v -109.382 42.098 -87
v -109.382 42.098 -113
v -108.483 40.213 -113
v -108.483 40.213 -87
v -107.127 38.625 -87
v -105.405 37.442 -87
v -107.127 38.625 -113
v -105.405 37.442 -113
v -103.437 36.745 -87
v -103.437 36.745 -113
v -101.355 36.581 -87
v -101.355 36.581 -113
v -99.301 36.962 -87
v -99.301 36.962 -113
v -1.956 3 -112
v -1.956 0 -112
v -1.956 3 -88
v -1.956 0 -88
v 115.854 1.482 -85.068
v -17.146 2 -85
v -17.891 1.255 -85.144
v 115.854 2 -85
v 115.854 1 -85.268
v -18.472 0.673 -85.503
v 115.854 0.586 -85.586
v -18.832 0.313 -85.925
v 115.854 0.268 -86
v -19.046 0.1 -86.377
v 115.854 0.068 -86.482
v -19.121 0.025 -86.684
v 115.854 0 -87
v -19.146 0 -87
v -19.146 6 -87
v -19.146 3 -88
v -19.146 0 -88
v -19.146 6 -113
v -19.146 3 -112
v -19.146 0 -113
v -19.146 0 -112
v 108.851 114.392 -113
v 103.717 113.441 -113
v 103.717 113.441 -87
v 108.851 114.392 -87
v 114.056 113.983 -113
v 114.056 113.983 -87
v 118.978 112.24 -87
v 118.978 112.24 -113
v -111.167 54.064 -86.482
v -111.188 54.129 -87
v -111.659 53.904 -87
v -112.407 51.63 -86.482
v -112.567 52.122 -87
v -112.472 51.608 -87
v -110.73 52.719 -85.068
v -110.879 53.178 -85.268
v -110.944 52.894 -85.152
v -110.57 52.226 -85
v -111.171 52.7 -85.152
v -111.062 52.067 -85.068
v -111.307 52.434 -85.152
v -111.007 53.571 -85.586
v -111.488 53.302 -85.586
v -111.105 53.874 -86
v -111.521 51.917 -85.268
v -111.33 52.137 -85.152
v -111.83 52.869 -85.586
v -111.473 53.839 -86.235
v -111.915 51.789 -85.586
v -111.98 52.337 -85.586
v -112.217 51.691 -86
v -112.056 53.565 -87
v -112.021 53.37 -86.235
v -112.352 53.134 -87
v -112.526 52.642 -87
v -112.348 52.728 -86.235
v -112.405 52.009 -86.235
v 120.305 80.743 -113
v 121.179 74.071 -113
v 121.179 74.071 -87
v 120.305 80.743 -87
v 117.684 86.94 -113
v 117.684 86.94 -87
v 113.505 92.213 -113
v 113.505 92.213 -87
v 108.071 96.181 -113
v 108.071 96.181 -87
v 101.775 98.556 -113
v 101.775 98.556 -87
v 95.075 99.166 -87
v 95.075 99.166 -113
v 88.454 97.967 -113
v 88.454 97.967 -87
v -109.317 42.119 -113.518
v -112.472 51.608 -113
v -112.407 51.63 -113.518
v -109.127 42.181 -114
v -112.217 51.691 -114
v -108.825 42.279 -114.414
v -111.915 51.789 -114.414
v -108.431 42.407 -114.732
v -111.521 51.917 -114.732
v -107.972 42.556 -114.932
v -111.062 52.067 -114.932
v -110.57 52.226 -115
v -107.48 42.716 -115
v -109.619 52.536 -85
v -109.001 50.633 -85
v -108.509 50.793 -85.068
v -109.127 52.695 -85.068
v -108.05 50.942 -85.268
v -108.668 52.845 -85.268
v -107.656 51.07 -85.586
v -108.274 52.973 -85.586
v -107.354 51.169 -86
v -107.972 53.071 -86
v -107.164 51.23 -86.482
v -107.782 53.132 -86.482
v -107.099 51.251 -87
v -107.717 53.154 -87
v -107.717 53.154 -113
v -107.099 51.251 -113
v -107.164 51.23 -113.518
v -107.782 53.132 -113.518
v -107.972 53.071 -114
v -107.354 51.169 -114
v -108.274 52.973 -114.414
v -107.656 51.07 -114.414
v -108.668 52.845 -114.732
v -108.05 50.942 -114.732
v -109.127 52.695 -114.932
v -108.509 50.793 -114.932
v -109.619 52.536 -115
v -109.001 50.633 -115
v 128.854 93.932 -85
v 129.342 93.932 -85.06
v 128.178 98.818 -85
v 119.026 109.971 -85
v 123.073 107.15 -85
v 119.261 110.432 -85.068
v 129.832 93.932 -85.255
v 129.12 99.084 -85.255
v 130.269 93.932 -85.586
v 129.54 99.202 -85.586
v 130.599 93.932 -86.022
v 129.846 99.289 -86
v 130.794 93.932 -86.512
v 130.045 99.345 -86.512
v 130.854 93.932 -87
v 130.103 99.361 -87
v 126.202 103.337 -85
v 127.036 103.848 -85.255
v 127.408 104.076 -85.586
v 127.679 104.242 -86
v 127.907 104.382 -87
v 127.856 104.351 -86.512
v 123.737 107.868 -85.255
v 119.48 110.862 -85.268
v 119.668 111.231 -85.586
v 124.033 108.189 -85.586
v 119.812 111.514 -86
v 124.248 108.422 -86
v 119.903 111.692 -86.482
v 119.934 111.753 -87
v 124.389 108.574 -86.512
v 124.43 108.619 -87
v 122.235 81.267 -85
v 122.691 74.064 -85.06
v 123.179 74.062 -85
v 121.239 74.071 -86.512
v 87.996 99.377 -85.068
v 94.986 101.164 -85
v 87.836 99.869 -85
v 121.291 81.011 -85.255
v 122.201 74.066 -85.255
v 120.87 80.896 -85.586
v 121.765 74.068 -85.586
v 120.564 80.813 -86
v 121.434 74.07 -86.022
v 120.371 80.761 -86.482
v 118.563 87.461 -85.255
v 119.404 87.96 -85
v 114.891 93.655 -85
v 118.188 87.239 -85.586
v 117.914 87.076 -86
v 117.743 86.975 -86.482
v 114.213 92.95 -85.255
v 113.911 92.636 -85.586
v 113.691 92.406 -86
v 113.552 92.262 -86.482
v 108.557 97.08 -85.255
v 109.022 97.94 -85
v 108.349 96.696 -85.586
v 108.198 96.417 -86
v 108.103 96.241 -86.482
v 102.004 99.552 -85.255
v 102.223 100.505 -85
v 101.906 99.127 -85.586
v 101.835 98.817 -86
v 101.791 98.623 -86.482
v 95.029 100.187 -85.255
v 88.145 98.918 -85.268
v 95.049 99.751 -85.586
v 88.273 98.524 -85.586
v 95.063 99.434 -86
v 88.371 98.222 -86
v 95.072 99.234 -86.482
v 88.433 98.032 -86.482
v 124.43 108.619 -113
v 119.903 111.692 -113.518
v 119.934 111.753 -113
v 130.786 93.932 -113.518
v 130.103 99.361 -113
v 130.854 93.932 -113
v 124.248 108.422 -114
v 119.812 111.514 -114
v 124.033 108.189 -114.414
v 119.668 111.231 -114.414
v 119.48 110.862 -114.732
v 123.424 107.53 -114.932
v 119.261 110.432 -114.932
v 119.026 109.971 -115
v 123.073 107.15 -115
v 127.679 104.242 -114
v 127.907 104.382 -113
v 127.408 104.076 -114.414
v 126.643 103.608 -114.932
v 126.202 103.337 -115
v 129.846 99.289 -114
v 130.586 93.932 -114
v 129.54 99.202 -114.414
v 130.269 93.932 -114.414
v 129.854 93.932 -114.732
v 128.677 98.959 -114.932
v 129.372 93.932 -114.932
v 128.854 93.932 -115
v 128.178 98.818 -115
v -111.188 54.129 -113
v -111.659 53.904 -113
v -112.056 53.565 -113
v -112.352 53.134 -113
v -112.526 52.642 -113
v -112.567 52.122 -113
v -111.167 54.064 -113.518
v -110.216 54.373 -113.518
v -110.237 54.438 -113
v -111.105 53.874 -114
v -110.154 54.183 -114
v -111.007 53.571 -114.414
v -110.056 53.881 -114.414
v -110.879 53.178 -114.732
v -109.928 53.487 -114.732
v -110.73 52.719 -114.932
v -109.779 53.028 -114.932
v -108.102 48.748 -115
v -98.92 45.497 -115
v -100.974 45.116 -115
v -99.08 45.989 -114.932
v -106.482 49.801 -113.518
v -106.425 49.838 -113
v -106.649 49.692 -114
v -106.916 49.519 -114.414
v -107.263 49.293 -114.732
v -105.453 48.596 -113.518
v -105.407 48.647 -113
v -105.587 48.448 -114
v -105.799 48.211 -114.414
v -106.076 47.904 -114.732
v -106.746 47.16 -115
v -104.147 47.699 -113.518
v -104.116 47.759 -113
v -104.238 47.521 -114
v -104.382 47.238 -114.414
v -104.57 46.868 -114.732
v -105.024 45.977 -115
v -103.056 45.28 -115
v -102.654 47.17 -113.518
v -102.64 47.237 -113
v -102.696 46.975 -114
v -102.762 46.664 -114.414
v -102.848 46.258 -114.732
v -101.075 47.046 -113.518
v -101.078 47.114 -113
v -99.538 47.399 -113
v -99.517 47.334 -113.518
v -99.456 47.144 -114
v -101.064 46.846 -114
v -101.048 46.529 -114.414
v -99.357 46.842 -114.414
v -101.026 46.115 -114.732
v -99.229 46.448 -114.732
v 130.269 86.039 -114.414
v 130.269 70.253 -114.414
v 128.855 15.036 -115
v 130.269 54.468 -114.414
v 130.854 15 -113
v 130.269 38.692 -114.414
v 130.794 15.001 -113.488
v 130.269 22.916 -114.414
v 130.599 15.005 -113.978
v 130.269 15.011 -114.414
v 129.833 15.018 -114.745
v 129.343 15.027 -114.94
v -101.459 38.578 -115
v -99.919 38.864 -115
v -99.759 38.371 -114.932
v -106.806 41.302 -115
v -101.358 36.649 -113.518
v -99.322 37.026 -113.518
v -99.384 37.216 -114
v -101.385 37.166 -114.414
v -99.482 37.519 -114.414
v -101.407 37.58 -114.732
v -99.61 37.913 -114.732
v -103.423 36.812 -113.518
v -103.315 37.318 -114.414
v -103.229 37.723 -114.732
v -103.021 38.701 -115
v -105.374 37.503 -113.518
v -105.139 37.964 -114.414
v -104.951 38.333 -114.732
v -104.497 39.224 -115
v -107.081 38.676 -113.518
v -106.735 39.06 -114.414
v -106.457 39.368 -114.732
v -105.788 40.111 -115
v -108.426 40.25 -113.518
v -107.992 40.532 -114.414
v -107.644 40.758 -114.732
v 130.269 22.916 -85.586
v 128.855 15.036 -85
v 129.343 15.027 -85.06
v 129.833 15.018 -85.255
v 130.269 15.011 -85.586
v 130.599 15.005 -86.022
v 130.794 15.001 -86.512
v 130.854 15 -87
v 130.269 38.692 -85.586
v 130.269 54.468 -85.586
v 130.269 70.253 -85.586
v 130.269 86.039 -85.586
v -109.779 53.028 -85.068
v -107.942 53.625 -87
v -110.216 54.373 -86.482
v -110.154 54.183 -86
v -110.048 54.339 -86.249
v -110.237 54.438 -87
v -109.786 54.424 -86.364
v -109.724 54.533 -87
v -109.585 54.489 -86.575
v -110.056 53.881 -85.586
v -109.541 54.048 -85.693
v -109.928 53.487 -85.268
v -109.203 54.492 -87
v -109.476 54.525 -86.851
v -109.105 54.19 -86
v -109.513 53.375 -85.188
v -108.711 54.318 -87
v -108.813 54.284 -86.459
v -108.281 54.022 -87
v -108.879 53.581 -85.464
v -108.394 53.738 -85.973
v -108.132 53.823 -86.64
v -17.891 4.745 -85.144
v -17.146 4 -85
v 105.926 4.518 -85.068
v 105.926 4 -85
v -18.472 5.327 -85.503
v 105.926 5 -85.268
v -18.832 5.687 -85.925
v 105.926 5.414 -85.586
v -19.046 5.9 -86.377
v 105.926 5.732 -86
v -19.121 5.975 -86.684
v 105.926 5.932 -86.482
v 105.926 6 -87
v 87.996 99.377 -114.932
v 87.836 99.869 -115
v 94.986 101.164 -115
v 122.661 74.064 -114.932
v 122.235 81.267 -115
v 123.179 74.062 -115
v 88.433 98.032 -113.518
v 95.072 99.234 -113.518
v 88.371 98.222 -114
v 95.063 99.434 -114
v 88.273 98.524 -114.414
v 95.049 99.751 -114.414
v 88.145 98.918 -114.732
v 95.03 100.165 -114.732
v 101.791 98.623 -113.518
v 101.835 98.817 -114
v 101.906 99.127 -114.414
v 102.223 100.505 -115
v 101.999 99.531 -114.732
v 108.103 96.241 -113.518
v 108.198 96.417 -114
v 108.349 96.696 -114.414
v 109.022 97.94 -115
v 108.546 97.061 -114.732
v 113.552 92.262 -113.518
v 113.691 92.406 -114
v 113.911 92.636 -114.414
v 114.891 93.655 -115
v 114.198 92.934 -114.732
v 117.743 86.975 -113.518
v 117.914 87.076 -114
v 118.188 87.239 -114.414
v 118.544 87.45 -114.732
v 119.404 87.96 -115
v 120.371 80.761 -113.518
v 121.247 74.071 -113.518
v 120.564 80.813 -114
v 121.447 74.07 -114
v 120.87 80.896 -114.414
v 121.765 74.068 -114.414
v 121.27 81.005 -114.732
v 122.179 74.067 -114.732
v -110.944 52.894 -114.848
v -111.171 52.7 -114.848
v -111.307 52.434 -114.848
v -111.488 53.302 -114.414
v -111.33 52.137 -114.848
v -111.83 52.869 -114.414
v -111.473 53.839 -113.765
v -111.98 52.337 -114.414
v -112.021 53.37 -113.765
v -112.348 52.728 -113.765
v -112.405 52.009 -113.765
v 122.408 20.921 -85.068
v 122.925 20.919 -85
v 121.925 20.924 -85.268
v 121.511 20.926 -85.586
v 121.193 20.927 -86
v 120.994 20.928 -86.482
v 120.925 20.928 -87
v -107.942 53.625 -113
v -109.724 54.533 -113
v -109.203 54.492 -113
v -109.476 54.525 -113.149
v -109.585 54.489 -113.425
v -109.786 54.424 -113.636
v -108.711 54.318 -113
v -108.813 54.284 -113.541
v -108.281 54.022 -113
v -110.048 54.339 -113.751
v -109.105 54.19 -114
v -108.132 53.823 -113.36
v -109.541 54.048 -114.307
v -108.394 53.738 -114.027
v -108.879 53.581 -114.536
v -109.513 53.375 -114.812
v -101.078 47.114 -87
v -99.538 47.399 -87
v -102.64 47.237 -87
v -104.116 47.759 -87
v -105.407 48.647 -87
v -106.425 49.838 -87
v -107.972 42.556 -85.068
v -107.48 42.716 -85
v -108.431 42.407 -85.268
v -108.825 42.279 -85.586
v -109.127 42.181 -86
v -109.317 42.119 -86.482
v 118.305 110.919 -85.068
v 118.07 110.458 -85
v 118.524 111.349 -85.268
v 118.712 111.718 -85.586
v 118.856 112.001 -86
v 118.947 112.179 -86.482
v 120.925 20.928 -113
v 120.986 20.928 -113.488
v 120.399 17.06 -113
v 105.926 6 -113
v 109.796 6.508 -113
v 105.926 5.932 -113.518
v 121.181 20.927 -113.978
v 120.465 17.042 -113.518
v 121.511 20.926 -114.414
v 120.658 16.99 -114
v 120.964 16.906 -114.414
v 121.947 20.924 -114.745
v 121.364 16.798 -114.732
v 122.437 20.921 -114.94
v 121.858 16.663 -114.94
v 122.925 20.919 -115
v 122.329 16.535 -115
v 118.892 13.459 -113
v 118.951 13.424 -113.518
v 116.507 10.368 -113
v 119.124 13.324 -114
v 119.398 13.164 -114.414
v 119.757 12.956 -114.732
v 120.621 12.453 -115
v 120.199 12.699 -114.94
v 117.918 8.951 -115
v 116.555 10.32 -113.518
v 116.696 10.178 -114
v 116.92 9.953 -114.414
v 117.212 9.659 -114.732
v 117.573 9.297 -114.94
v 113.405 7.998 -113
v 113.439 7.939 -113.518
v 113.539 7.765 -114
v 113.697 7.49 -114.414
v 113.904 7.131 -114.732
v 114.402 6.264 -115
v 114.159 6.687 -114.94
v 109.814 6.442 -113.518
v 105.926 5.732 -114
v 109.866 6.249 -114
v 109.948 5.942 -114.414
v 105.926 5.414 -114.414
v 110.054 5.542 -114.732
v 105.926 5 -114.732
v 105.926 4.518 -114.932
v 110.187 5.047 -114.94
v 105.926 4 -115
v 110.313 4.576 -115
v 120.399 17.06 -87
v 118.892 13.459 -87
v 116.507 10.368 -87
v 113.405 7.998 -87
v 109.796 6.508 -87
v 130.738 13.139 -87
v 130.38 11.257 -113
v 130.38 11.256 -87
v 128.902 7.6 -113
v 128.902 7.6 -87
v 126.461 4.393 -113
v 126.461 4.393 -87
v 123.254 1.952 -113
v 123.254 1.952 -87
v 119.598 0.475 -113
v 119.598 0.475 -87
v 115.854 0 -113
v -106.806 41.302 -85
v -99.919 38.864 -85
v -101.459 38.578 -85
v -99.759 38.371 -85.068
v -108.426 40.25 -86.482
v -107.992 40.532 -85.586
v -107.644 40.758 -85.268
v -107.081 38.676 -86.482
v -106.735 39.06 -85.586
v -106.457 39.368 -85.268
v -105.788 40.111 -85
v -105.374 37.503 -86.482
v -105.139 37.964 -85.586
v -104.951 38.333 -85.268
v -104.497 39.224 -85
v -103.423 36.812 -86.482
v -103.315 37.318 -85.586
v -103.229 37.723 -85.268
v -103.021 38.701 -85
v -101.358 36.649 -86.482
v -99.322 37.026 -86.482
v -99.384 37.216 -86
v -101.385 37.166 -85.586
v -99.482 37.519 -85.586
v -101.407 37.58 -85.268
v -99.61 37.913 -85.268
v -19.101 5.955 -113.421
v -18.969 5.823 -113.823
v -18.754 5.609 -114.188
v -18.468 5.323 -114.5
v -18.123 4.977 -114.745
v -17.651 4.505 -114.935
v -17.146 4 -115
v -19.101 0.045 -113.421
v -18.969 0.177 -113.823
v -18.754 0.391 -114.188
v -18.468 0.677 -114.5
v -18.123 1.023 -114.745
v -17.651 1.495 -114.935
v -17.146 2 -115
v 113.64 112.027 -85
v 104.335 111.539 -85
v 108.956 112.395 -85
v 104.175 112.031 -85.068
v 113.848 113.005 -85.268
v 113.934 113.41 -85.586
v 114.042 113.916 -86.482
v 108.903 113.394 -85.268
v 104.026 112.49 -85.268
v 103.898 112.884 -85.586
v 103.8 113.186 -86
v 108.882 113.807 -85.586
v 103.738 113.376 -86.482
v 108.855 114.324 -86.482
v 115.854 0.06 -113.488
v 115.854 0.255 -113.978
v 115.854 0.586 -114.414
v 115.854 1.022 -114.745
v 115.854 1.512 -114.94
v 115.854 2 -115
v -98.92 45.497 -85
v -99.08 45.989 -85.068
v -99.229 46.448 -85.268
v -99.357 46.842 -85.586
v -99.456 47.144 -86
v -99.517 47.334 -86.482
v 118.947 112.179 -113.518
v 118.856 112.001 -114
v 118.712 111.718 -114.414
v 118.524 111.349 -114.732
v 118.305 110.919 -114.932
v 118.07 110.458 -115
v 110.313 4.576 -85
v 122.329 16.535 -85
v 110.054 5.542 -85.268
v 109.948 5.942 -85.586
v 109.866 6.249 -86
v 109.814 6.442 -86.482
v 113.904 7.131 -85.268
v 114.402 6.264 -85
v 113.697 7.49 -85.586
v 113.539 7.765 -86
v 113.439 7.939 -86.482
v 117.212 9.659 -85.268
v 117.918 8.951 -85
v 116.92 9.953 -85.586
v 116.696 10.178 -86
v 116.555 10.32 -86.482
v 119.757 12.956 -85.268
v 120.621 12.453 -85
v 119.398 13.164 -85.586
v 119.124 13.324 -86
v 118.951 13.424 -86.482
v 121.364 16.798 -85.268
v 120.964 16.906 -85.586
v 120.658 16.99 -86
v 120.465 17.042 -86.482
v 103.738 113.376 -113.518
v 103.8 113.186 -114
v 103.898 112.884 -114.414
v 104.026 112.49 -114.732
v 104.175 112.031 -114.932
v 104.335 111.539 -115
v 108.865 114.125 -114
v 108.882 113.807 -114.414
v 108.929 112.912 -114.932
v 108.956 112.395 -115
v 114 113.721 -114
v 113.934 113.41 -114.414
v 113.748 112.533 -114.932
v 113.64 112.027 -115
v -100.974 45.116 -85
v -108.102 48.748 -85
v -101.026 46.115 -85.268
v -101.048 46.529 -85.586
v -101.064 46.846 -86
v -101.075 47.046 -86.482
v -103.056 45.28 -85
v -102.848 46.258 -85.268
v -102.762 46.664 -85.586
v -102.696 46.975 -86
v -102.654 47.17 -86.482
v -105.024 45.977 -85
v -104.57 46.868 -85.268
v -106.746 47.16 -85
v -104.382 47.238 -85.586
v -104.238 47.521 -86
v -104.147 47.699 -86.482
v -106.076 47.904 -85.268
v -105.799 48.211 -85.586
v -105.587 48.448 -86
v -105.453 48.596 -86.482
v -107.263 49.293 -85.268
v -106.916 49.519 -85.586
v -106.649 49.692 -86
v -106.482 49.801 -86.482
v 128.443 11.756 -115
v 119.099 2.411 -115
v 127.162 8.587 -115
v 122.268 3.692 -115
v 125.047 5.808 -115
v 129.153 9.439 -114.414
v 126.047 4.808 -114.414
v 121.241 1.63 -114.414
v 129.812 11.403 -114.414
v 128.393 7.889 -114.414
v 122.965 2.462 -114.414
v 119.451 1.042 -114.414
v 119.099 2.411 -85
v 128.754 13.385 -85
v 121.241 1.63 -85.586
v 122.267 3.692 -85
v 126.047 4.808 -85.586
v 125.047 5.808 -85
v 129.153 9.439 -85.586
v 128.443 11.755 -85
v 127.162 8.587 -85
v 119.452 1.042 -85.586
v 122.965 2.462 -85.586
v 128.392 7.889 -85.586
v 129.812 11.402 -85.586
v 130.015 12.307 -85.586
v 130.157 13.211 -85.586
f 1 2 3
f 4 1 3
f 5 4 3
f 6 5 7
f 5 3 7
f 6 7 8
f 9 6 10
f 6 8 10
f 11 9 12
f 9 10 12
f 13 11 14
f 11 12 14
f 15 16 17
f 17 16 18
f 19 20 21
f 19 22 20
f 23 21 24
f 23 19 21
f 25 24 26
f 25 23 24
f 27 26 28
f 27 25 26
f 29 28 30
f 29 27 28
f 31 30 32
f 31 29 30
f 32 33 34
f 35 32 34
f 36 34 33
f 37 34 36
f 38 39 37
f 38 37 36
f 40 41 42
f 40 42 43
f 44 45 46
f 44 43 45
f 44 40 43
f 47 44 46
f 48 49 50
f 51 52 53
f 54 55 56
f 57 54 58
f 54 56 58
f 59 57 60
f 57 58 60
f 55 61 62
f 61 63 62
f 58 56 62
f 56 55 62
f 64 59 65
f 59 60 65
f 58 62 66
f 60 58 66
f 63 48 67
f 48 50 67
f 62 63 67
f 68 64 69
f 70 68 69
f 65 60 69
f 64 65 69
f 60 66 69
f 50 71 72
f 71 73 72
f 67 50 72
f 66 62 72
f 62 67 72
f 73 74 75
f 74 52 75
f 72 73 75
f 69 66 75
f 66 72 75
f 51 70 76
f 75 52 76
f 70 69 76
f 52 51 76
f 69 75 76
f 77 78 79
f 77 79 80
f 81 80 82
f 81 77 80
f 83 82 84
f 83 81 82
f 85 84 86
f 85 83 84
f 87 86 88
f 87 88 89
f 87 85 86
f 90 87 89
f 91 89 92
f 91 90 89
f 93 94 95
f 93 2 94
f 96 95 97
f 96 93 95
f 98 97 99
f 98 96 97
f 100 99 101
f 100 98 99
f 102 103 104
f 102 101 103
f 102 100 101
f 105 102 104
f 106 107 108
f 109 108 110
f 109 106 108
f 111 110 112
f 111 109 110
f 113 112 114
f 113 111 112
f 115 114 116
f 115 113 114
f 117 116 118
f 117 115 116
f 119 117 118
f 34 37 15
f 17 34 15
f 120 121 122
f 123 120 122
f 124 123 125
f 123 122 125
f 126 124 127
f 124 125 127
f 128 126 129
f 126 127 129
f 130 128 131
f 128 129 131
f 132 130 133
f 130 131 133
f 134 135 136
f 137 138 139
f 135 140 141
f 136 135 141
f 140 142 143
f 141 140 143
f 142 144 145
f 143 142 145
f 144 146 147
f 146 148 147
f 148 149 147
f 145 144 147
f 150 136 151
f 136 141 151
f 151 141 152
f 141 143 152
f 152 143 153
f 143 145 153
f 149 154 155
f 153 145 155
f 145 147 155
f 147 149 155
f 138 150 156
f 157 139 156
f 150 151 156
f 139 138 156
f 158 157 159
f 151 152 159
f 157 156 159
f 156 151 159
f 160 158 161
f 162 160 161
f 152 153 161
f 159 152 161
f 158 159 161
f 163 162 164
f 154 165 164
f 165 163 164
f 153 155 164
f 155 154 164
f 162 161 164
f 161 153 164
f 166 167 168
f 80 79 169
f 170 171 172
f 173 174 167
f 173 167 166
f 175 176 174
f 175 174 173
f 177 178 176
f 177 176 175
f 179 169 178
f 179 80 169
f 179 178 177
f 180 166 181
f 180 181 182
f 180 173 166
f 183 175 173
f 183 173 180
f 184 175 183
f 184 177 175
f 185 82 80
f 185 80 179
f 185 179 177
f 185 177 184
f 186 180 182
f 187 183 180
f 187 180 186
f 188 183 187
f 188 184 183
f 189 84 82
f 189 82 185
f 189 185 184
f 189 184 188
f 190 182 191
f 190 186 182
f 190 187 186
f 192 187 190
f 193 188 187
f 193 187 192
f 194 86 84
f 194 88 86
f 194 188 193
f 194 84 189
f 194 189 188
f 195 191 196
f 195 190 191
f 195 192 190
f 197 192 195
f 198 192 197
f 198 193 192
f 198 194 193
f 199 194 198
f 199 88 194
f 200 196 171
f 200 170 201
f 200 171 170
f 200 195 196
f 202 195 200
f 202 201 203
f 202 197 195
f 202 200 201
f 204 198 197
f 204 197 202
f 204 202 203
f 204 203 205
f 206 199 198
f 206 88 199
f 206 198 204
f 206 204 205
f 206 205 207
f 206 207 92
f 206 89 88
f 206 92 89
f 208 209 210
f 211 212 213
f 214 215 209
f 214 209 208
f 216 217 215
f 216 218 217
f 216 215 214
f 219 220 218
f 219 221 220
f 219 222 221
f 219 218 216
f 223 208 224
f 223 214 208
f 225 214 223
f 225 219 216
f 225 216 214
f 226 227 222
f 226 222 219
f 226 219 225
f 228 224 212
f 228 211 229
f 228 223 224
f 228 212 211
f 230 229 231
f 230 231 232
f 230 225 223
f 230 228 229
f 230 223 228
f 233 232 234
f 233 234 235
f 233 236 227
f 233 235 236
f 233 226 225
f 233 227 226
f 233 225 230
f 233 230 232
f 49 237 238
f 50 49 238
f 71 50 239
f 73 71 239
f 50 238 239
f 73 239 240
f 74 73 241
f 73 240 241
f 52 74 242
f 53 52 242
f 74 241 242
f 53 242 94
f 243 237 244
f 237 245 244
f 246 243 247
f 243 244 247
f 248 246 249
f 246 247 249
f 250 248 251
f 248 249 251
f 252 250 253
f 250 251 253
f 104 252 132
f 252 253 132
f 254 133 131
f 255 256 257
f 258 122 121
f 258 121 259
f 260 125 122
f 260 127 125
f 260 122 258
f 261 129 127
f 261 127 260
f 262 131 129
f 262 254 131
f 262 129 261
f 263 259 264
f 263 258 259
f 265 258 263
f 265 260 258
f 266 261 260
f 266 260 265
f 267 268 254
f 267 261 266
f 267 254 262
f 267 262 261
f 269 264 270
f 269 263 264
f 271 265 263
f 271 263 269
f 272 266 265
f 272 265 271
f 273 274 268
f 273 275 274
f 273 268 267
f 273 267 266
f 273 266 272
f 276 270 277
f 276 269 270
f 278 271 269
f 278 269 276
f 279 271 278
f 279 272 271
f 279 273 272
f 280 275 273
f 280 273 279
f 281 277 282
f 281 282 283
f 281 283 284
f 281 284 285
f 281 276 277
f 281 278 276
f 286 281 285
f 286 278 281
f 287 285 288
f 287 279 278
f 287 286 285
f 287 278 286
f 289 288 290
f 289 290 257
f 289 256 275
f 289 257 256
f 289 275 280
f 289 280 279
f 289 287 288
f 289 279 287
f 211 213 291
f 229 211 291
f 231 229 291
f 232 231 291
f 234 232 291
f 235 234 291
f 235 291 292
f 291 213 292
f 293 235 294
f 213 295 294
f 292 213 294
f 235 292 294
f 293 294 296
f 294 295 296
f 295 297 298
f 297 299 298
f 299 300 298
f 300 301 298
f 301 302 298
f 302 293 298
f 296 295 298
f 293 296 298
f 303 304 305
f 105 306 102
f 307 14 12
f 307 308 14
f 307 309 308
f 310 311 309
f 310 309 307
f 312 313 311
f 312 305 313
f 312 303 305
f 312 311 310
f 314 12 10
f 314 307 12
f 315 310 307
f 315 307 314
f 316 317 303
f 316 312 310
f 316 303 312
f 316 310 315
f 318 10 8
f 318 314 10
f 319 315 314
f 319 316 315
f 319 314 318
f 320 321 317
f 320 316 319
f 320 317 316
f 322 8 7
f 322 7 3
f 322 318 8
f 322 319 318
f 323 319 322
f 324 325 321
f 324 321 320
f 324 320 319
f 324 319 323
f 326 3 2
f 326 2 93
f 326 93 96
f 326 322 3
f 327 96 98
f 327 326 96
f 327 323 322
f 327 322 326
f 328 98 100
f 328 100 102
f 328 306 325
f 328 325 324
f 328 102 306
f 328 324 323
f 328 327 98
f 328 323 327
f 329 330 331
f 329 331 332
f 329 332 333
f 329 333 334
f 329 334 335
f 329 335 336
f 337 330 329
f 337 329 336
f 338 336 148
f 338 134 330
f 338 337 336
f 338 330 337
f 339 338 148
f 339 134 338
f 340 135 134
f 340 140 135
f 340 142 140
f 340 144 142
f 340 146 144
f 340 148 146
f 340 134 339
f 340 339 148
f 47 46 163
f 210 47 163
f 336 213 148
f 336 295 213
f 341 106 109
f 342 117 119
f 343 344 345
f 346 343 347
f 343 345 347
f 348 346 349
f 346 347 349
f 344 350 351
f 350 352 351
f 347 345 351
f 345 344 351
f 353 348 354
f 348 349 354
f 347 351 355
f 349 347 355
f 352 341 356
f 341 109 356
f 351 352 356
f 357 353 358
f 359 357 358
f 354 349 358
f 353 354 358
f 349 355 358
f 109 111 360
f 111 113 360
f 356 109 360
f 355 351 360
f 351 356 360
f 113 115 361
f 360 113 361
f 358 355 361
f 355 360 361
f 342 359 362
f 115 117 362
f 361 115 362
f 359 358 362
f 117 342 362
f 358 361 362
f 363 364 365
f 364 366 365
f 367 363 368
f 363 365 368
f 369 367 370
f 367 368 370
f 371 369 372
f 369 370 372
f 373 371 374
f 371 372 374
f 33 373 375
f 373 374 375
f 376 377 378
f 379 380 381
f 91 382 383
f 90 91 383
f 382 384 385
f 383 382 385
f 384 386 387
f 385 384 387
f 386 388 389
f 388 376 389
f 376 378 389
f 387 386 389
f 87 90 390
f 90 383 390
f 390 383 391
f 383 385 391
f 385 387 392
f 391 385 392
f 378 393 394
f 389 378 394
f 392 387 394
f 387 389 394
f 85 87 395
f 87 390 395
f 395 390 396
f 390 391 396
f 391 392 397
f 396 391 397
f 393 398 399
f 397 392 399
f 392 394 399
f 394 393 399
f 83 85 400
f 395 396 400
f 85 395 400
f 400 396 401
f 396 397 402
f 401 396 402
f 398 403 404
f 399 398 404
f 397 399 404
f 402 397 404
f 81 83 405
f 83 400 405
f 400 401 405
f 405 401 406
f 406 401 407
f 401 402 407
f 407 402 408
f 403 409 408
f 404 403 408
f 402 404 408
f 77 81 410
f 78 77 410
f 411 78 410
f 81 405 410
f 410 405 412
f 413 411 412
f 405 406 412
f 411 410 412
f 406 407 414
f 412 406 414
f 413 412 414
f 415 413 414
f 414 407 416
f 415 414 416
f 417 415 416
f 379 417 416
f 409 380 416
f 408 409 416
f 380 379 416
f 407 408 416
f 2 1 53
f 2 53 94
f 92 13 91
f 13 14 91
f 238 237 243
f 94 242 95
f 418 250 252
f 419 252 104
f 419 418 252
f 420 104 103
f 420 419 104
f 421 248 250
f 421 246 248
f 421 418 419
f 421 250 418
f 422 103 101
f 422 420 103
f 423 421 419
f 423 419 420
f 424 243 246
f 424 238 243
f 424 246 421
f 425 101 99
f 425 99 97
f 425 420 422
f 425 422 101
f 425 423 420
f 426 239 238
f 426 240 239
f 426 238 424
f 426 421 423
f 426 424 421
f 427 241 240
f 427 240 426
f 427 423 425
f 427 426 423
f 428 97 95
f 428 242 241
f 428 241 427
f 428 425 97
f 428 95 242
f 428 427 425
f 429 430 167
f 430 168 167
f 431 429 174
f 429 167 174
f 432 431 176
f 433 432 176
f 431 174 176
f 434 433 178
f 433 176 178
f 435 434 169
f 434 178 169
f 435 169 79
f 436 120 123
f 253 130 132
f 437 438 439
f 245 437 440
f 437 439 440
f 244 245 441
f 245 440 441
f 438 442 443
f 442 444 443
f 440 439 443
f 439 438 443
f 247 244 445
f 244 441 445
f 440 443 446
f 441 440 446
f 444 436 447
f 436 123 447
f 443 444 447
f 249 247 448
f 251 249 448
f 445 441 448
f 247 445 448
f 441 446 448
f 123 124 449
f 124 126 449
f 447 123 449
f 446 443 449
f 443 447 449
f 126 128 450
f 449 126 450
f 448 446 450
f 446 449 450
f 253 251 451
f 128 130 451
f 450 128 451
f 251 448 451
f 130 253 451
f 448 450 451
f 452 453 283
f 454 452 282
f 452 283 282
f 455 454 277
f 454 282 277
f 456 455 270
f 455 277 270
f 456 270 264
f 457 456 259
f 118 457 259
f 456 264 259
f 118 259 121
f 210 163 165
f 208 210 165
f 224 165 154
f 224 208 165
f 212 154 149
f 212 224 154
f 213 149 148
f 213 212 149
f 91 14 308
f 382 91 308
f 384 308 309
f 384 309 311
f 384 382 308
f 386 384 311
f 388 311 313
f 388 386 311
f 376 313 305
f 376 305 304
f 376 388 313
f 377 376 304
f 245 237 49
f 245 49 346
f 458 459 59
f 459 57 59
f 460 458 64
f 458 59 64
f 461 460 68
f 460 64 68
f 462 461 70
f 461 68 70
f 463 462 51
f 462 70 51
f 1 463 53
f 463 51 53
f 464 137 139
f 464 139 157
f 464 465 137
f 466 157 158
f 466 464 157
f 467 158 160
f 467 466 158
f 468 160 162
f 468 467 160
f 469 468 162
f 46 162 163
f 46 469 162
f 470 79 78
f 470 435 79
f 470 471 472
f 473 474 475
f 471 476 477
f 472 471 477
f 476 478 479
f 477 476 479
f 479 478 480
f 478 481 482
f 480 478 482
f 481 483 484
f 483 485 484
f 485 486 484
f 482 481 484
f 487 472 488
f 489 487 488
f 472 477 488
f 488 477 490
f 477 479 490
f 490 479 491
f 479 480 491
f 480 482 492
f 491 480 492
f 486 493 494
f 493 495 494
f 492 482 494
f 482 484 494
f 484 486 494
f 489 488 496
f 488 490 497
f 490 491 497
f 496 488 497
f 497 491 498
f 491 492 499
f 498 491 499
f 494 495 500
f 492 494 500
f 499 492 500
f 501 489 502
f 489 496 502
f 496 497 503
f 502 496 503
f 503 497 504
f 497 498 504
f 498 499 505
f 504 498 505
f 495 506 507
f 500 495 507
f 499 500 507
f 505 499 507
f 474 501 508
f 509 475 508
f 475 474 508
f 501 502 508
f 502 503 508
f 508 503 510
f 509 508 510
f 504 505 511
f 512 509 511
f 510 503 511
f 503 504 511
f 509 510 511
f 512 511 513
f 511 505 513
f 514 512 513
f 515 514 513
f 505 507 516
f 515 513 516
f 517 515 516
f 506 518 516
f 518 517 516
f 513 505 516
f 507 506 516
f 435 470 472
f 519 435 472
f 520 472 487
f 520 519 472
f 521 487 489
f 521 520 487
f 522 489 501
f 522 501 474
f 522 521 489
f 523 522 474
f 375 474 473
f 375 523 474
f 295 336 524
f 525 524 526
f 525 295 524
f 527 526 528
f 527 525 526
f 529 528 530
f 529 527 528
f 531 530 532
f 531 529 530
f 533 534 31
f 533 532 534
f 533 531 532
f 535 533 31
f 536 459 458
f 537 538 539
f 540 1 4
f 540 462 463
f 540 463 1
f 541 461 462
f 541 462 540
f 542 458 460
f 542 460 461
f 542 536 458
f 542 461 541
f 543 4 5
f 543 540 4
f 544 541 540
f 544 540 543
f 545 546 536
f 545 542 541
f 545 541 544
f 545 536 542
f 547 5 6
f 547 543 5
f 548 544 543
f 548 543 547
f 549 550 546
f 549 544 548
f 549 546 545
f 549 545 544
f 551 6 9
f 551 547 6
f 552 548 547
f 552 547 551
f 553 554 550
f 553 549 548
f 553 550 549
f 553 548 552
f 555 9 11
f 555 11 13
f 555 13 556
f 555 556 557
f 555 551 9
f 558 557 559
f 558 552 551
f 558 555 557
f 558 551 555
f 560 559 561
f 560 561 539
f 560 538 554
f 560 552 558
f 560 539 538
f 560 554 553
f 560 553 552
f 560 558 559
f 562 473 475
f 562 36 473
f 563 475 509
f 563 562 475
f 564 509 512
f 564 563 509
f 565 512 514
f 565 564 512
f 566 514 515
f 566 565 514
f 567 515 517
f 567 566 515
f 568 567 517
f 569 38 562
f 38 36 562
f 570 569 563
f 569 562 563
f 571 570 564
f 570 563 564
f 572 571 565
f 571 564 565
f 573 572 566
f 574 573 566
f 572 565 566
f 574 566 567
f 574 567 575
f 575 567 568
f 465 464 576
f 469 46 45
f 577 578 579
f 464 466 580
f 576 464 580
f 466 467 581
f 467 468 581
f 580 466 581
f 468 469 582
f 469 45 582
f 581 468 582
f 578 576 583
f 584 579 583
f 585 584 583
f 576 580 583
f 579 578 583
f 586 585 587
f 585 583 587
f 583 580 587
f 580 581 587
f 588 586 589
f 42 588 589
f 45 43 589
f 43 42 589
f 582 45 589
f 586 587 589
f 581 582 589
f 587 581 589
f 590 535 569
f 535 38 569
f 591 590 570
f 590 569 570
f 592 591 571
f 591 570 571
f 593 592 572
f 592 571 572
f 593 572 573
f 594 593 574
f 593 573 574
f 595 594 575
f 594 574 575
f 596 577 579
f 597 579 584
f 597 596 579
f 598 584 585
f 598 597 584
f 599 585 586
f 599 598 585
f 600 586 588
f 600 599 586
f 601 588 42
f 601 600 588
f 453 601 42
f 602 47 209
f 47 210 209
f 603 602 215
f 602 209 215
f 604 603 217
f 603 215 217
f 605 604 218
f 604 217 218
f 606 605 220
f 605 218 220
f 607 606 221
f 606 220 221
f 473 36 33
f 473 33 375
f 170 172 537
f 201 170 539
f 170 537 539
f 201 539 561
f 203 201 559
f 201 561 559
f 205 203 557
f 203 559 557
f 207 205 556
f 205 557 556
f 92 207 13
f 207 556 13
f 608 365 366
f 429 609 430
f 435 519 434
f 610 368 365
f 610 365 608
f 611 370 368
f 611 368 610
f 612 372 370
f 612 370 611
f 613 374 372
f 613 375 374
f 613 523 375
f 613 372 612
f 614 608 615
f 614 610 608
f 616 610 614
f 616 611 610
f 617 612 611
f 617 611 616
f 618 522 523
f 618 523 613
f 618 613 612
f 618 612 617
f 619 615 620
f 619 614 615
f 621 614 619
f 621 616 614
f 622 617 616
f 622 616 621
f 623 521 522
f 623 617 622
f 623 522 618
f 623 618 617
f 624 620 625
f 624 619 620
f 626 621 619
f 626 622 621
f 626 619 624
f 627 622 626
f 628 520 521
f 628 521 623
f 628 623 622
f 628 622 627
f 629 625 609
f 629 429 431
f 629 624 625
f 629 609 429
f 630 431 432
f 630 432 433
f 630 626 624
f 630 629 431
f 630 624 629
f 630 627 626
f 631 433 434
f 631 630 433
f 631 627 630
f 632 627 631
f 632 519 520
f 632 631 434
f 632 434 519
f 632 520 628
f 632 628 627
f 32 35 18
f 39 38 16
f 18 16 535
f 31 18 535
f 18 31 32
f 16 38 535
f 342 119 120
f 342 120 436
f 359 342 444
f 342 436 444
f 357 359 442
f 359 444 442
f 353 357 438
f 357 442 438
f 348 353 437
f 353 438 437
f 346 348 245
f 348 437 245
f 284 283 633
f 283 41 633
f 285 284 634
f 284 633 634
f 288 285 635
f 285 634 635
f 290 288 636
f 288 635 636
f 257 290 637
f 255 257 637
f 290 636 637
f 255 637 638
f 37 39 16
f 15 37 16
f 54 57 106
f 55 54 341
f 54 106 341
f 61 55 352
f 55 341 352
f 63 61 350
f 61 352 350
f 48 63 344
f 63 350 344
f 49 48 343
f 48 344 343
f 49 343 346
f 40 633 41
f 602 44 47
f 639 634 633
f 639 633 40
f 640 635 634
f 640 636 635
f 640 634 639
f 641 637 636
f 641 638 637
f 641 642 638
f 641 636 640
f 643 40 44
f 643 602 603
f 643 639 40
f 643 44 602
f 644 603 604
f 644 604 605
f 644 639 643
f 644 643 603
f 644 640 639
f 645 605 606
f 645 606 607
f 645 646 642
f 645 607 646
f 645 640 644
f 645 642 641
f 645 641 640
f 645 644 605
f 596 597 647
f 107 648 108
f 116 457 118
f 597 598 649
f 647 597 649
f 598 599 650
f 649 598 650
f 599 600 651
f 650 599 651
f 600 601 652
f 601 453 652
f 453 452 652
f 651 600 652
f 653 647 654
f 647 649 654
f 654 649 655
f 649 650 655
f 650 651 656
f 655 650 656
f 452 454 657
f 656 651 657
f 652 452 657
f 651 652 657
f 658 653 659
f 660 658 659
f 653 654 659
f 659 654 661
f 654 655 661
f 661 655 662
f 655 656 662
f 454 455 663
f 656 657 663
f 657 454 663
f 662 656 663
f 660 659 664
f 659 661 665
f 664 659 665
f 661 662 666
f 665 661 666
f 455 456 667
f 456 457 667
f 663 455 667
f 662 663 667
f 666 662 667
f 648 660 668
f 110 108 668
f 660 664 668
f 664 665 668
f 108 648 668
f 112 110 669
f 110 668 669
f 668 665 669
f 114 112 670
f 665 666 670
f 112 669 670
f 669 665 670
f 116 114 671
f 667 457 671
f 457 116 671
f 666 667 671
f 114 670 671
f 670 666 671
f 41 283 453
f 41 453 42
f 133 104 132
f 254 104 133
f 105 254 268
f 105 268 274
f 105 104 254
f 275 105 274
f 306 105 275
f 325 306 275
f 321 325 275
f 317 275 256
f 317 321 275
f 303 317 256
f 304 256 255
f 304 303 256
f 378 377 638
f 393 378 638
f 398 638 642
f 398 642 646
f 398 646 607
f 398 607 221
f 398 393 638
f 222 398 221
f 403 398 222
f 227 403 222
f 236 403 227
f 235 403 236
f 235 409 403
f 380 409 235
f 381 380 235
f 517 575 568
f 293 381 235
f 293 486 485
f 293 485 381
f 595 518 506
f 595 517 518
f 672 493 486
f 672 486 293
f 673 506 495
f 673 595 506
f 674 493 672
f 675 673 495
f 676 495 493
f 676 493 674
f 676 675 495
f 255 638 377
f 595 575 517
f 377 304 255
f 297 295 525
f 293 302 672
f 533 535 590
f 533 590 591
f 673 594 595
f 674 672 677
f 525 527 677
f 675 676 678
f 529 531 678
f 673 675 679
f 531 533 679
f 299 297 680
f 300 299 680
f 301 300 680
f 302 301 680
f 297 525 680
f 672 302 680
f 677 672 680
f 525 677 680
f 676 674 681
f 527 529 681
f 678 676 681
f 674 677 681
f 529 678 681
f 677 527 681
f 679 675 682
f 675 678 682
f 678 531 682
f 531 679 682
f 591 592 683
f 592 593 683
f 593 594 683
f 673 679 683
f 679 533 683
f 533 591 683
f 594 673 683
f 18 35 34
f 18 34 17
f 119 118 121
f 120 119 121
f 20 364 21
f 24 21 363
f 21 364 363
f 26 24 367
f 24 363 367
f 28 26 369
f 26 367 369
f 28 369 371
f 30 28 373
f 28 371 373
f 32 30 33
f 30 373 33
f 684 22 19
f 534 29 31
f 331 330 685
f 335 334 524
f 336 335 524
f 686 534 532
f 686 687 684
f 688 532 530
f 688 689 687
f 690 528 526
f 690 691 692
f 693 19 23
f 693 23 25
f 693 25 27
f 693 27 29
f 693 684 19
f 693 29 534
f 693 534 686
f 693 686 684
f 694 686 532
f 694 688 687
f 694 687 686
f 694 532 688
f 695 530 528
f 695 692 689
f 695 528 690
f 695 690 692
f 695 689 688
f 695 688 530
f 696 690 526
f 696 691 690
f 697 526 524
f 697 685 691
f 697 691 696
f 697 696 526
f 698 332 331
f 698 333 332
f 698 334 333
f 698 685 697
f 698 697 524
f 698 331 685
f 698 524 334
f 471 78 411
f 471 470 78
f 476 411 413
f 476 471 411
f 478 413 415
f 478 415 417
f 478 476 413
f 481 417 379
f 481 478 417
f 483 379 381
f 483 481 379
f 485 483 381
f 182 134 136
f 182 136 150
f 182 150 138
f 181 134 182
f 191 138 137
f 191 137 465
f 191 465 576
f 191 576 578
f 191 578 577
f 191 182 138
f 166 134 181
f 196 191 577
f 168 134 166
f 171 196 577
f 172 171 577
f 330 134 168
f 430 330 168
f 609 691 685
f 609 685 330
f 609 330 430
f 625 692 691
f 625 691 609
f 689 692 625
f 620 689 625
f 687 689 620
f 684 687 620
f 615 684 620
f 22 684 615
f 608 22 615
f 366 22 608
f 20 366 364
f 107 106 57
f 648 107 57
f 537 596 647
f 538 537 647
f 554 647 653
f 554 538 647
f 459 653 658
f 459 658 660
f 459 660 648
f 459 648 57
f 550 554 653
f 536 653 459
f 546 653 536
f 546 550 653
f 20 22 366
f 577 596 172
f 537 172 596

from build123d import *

# Parameters (mm, degrees)
SKETCH2_W           = 250
SKETCH2_H           = 30
BOSS_EXTRUDE1_DEPTH = 10
SKETCH3_W           = 5
SKETCH3_H           = 30
BOSS_EXTRUDE2_DEPTH = 10
SKETCH4_W           = 150
SKETCH4_H           = 30
BOSS_EXTRUDE3_DEPTH = 6
FILLET1_R           = 15
FILLET8_R           = 25
CHAMFER1_SIZE       = 17
FILLET3_R           = 20
FILLET5_R           = 6
FILLET6_R           = 2
FILLET7_R           = 8
SKETCH7_W           = 24
SKETCH7_H           = 24
CUT_EXTRUDE1_DEPTH  = 3


with BuildPart() as part:
    # Sketch2 → Boss-Extrude1 (new body)
    with BuildSketch(Plane(origin=(-23.43534086, 72.126562752, 0), x_dir=(0.9510565162951534, 0.3090169943749482, 0), z_dir=(-0.3090169943749481, 0.9510565162951533, 0))):
        with Locations((33.98053096, 100)):
            Rectangle(SKETCH2_W, SKETCH2_H)
    extrude(amount=-BOSS_EXTRUDE1_DEPTH)

    # Sketch3 → Boss-Extrude2 (add)
    with BuildSketch(Plane(origin=(-23.43534086, 72.126562752, 0), x_dir=(0.9510565162951534, 0.3090169943749482, 0), z_dir=(-0.3090169943749481, 0.9510565162951533, 0))):
        with Locations((-88.51946904, 100)):
            Rectangle(SKETCH3_W, SKETCH3_H)
    extrude(amount=BOSS_EXTRUDE2_DEPTH)



with BuildPart() as body_2:
    # Sketch4 → Boss-Extrude3 (new body)
    with BuildSketch(Plane(origin=(0, 0, 0), x_dir=(1, 0, 0), z_dir=(0, 1, 0))):
        with Locations((55.854299018, 100)):
            Rectangle(SKETCH4_W, SKETCH4_H)
    extrude(amount=BOSS_EXTRUDE3_DEPTH)


with BuildPart() as part_1:
    add(part.part)

    add(body_2.part)  # Loft1 merges body 2
    # Sketch6 → Loft1 section 0
    with BuildSketch(Plane(origin=(-20.345170916, 62.615997589, 0), x_dir=(0.9510565162951534, 0.3090169943749482, 0), z_dir=(0.3090169943749481, -0.9510565162951533, 0))):
        with BuildLine():
            Line((158.98053096, -85), (148.98053096, -85))
            Line((148.98053096, -85), (148.98053096, -115))
            Line((148.98053096, -115), (158.98053096, -115))
            Line((158.98053096, -115), (158.98053096, -85))
        make_face()
    # Sketch5 → Loft1 section 1
    with BuildSketch(Plane(origin=(0, 6, 0), x_dir=(1, 0, 0), z_dir=(0, 1, 0))):
        with BuildLine():
            Line((130.854299018, 115), (120.854299018, 115))
            Line((120.854299018, 115), (120.854299018, 85))
            Line((120.854299018, 85), (130.854299018, 85))
            Line((130.854299018, 85), (130.854299018, 115))
        make_face()
    loft()

    # Fillet1
    fillet1_edges = [part_1.edges().sort_by_distance(p)[0] for p in [
        (130.854299018, 0, -100),
        (120.854299018, 6, -100),
    ]]
    fillet(fillet1_edges, radius=FILLET1_R)

    # Fillet8
    fillet8_edges = [part_1.edges().sort_by_distance(p)[0] for p in [
        (121.343733855, 108.653513487, -100),
    ]]
    fillet(fillet8_edges, radius=FILLET8_R)

    # Chamfer1
    # the kernel refuses this chamfer: 17 mm, written as the material it takes off along each edge
    with BuildSketch(Plane(origin=(127.764129074, 121.254248594, -41.281389205), x_dir=(-0.9591936310578489, -0.28275002765350715, 0), z_dir=(0, 0, -1))) as chamfer1_piece_1:
        Polygon((CHAMFER1_SIZE * 0.999621916911, -CHAMFER1_SIZE * 0.0274958766106), (-CHAMFER1_SIZE * 0.0274958766106, -CHAMFER1_SIZE * 0.999621916911), (0, 0), align=None)
    extrude(amount=117.437221591, mode=Mode.SUBTRACT)

    # Fillet3
    fillet3_edges = [part_1.edges().sort_by_distance(p)[0] for p in [
        (130.854299018, 106.188451977, -100),
        (111.596168297, 116.000959689, -100),
    ]]
    fillet(fillet3_edges, radius=FILLET3_R)

    # Fillet5
    fillet5_edges = [part_1.edges().sort_by_distance(p)[0] for p in [
        (-105.244717419, 45.545084972, -100),
    ]]
    fillet(fillet5_edges, radius=FILLET5_R)

    # Fillet6
    fillet6_edges = [part_1.edges().sort_by_distance(p)[0] for p in [
        (2.089489912, 80.420083013, -115),
        (-104.116423285, 47.759486891, -115),
        (-104.116423285, 47.759486891, -85),
        (-107.716853374, 53.153537102, -85),
        (-107.716853374, 53.153537102, -115),
        (-113.090169944, 53.510565163, -100),
        (-9.228059595, 66.228166023, -115),
        (-110.712528653, 54.283107649, -85),
        (-108.334887362, 55.055650135, -100),
        (-110.712528653, 54.283107649, -115),
        (43.389972522, 6, -85),
        (-19.145700982, 3, -115),
        (48.354299018, 0, -85),
        (-19.145700982, 3, -85),
        (43.389972522, 6, -115),
        (48.354299018, 0, -115),
        (126.460900735, 4.393398282, -115),
        (126.460900735, 4.393398282, -85),
        (116.506932566, 10.368143382, -85),
        (116.506932566, 10.368143382, -115),
        (121.052163557, 47.499886569, -115),
        (121.052163557, 47.499886569, -85),
        (-9.228059595, 66.228166023, -85),
        (110.921940595, 94.380821213, -115),
        (110.921940595, 94.380821213, -85),
        (-110, 44, -115),
        (-110, 44, -85),
        (130.854299018, 54.466218107, -115),
        (130.854299018, 54.466218107, -85),
        (119.455808519, 111.996272972, -85),
        (2.089489912, 80.420083013, -85),
        (111.466879946, 114.358195437, -85),
        (127.907102305, 104.382407509, -85),
        (119.455808519, 111.996272972, -115),
        (111.466879946, 114.358195437, -115),
        (127.907102305, 104.382407509, -115),
    ]]
    fillet(fillet6_edges, radius=FILLET6_R)

    # Fillet7
    # the kernel refuses this fillet: 8 mm, written as the material it takes off along each edge
    with BuildSketch(Plane(origin=(-101.773513881, 44.570022922, -85), x_dir=(-0.9510565162951534, -0.3090169943749482, 0), z_dir=(-0.3090169943749482, 0.9510565162951534, 0))) as fillet7_piece_1:
        with BuildLine():
            CenterArc((6, -2), 2, 0, 90)
            Line((8, -2), (8, 0))
            Line((8, 0), (6, 0))
        make_face()
    revolve(axis=Axis((-101.773513881, 44.570022922, -85), (0, 0, 1)), revolution_arc=90, mode=Mode.SUBTRACT)
    with BuildSketch(Plane(origin=(-101.773513881, 44.570022922, -115), x_dir=(0.3090169943749482, -0.9510565162951534, 0), z_dir=(0.9510565162951534, 0.3090169943749482, 0))) as fillet7_piece_2:
        with BuildLine():
            CenterArc((6, -2), 2, 0, 90)
            Line((8, -2), (8, 0))
            Line((8, 0), (6, 0))
        make_face()
    revolve(axis=Axis((-101.773513881, 44.570022922, -115), (0, 0, -1)), revolution_arc=90, mode=Mode.SUBTRACT)
    with BuildSketch(Plane(origin=(-106.909830056, 34.489434837, -115), x_dir=(0.9510565162951533, 0.3090169943749485, 0), z_dir=(0, 0, 1))) as fillet7_piece_3:
        with BuildLine():
            CenterArc((FILLET7_R, FILLET7_R), FILLET7_R, 180, 90)
            Line((0, FILLET7_R), (0, 0))
            Line((0, 0), (FILLET7_R, 0))
        make_face()
    extrude(amount=30, mode=Mode.SUBTRACT)

    # Sketch7 → Cut-Extrude1 (cut)
    with BuildSketch(Plane.XZ):
        with Locations((-13.956396798, -100)):
            Rectangle(SKETCH7_W, SKETCH7_H)
    extrude(amount=-CUT_EXTRUDE1_DEPTH, mode=Mode.SUBTRACT)


solid = part_1.part
